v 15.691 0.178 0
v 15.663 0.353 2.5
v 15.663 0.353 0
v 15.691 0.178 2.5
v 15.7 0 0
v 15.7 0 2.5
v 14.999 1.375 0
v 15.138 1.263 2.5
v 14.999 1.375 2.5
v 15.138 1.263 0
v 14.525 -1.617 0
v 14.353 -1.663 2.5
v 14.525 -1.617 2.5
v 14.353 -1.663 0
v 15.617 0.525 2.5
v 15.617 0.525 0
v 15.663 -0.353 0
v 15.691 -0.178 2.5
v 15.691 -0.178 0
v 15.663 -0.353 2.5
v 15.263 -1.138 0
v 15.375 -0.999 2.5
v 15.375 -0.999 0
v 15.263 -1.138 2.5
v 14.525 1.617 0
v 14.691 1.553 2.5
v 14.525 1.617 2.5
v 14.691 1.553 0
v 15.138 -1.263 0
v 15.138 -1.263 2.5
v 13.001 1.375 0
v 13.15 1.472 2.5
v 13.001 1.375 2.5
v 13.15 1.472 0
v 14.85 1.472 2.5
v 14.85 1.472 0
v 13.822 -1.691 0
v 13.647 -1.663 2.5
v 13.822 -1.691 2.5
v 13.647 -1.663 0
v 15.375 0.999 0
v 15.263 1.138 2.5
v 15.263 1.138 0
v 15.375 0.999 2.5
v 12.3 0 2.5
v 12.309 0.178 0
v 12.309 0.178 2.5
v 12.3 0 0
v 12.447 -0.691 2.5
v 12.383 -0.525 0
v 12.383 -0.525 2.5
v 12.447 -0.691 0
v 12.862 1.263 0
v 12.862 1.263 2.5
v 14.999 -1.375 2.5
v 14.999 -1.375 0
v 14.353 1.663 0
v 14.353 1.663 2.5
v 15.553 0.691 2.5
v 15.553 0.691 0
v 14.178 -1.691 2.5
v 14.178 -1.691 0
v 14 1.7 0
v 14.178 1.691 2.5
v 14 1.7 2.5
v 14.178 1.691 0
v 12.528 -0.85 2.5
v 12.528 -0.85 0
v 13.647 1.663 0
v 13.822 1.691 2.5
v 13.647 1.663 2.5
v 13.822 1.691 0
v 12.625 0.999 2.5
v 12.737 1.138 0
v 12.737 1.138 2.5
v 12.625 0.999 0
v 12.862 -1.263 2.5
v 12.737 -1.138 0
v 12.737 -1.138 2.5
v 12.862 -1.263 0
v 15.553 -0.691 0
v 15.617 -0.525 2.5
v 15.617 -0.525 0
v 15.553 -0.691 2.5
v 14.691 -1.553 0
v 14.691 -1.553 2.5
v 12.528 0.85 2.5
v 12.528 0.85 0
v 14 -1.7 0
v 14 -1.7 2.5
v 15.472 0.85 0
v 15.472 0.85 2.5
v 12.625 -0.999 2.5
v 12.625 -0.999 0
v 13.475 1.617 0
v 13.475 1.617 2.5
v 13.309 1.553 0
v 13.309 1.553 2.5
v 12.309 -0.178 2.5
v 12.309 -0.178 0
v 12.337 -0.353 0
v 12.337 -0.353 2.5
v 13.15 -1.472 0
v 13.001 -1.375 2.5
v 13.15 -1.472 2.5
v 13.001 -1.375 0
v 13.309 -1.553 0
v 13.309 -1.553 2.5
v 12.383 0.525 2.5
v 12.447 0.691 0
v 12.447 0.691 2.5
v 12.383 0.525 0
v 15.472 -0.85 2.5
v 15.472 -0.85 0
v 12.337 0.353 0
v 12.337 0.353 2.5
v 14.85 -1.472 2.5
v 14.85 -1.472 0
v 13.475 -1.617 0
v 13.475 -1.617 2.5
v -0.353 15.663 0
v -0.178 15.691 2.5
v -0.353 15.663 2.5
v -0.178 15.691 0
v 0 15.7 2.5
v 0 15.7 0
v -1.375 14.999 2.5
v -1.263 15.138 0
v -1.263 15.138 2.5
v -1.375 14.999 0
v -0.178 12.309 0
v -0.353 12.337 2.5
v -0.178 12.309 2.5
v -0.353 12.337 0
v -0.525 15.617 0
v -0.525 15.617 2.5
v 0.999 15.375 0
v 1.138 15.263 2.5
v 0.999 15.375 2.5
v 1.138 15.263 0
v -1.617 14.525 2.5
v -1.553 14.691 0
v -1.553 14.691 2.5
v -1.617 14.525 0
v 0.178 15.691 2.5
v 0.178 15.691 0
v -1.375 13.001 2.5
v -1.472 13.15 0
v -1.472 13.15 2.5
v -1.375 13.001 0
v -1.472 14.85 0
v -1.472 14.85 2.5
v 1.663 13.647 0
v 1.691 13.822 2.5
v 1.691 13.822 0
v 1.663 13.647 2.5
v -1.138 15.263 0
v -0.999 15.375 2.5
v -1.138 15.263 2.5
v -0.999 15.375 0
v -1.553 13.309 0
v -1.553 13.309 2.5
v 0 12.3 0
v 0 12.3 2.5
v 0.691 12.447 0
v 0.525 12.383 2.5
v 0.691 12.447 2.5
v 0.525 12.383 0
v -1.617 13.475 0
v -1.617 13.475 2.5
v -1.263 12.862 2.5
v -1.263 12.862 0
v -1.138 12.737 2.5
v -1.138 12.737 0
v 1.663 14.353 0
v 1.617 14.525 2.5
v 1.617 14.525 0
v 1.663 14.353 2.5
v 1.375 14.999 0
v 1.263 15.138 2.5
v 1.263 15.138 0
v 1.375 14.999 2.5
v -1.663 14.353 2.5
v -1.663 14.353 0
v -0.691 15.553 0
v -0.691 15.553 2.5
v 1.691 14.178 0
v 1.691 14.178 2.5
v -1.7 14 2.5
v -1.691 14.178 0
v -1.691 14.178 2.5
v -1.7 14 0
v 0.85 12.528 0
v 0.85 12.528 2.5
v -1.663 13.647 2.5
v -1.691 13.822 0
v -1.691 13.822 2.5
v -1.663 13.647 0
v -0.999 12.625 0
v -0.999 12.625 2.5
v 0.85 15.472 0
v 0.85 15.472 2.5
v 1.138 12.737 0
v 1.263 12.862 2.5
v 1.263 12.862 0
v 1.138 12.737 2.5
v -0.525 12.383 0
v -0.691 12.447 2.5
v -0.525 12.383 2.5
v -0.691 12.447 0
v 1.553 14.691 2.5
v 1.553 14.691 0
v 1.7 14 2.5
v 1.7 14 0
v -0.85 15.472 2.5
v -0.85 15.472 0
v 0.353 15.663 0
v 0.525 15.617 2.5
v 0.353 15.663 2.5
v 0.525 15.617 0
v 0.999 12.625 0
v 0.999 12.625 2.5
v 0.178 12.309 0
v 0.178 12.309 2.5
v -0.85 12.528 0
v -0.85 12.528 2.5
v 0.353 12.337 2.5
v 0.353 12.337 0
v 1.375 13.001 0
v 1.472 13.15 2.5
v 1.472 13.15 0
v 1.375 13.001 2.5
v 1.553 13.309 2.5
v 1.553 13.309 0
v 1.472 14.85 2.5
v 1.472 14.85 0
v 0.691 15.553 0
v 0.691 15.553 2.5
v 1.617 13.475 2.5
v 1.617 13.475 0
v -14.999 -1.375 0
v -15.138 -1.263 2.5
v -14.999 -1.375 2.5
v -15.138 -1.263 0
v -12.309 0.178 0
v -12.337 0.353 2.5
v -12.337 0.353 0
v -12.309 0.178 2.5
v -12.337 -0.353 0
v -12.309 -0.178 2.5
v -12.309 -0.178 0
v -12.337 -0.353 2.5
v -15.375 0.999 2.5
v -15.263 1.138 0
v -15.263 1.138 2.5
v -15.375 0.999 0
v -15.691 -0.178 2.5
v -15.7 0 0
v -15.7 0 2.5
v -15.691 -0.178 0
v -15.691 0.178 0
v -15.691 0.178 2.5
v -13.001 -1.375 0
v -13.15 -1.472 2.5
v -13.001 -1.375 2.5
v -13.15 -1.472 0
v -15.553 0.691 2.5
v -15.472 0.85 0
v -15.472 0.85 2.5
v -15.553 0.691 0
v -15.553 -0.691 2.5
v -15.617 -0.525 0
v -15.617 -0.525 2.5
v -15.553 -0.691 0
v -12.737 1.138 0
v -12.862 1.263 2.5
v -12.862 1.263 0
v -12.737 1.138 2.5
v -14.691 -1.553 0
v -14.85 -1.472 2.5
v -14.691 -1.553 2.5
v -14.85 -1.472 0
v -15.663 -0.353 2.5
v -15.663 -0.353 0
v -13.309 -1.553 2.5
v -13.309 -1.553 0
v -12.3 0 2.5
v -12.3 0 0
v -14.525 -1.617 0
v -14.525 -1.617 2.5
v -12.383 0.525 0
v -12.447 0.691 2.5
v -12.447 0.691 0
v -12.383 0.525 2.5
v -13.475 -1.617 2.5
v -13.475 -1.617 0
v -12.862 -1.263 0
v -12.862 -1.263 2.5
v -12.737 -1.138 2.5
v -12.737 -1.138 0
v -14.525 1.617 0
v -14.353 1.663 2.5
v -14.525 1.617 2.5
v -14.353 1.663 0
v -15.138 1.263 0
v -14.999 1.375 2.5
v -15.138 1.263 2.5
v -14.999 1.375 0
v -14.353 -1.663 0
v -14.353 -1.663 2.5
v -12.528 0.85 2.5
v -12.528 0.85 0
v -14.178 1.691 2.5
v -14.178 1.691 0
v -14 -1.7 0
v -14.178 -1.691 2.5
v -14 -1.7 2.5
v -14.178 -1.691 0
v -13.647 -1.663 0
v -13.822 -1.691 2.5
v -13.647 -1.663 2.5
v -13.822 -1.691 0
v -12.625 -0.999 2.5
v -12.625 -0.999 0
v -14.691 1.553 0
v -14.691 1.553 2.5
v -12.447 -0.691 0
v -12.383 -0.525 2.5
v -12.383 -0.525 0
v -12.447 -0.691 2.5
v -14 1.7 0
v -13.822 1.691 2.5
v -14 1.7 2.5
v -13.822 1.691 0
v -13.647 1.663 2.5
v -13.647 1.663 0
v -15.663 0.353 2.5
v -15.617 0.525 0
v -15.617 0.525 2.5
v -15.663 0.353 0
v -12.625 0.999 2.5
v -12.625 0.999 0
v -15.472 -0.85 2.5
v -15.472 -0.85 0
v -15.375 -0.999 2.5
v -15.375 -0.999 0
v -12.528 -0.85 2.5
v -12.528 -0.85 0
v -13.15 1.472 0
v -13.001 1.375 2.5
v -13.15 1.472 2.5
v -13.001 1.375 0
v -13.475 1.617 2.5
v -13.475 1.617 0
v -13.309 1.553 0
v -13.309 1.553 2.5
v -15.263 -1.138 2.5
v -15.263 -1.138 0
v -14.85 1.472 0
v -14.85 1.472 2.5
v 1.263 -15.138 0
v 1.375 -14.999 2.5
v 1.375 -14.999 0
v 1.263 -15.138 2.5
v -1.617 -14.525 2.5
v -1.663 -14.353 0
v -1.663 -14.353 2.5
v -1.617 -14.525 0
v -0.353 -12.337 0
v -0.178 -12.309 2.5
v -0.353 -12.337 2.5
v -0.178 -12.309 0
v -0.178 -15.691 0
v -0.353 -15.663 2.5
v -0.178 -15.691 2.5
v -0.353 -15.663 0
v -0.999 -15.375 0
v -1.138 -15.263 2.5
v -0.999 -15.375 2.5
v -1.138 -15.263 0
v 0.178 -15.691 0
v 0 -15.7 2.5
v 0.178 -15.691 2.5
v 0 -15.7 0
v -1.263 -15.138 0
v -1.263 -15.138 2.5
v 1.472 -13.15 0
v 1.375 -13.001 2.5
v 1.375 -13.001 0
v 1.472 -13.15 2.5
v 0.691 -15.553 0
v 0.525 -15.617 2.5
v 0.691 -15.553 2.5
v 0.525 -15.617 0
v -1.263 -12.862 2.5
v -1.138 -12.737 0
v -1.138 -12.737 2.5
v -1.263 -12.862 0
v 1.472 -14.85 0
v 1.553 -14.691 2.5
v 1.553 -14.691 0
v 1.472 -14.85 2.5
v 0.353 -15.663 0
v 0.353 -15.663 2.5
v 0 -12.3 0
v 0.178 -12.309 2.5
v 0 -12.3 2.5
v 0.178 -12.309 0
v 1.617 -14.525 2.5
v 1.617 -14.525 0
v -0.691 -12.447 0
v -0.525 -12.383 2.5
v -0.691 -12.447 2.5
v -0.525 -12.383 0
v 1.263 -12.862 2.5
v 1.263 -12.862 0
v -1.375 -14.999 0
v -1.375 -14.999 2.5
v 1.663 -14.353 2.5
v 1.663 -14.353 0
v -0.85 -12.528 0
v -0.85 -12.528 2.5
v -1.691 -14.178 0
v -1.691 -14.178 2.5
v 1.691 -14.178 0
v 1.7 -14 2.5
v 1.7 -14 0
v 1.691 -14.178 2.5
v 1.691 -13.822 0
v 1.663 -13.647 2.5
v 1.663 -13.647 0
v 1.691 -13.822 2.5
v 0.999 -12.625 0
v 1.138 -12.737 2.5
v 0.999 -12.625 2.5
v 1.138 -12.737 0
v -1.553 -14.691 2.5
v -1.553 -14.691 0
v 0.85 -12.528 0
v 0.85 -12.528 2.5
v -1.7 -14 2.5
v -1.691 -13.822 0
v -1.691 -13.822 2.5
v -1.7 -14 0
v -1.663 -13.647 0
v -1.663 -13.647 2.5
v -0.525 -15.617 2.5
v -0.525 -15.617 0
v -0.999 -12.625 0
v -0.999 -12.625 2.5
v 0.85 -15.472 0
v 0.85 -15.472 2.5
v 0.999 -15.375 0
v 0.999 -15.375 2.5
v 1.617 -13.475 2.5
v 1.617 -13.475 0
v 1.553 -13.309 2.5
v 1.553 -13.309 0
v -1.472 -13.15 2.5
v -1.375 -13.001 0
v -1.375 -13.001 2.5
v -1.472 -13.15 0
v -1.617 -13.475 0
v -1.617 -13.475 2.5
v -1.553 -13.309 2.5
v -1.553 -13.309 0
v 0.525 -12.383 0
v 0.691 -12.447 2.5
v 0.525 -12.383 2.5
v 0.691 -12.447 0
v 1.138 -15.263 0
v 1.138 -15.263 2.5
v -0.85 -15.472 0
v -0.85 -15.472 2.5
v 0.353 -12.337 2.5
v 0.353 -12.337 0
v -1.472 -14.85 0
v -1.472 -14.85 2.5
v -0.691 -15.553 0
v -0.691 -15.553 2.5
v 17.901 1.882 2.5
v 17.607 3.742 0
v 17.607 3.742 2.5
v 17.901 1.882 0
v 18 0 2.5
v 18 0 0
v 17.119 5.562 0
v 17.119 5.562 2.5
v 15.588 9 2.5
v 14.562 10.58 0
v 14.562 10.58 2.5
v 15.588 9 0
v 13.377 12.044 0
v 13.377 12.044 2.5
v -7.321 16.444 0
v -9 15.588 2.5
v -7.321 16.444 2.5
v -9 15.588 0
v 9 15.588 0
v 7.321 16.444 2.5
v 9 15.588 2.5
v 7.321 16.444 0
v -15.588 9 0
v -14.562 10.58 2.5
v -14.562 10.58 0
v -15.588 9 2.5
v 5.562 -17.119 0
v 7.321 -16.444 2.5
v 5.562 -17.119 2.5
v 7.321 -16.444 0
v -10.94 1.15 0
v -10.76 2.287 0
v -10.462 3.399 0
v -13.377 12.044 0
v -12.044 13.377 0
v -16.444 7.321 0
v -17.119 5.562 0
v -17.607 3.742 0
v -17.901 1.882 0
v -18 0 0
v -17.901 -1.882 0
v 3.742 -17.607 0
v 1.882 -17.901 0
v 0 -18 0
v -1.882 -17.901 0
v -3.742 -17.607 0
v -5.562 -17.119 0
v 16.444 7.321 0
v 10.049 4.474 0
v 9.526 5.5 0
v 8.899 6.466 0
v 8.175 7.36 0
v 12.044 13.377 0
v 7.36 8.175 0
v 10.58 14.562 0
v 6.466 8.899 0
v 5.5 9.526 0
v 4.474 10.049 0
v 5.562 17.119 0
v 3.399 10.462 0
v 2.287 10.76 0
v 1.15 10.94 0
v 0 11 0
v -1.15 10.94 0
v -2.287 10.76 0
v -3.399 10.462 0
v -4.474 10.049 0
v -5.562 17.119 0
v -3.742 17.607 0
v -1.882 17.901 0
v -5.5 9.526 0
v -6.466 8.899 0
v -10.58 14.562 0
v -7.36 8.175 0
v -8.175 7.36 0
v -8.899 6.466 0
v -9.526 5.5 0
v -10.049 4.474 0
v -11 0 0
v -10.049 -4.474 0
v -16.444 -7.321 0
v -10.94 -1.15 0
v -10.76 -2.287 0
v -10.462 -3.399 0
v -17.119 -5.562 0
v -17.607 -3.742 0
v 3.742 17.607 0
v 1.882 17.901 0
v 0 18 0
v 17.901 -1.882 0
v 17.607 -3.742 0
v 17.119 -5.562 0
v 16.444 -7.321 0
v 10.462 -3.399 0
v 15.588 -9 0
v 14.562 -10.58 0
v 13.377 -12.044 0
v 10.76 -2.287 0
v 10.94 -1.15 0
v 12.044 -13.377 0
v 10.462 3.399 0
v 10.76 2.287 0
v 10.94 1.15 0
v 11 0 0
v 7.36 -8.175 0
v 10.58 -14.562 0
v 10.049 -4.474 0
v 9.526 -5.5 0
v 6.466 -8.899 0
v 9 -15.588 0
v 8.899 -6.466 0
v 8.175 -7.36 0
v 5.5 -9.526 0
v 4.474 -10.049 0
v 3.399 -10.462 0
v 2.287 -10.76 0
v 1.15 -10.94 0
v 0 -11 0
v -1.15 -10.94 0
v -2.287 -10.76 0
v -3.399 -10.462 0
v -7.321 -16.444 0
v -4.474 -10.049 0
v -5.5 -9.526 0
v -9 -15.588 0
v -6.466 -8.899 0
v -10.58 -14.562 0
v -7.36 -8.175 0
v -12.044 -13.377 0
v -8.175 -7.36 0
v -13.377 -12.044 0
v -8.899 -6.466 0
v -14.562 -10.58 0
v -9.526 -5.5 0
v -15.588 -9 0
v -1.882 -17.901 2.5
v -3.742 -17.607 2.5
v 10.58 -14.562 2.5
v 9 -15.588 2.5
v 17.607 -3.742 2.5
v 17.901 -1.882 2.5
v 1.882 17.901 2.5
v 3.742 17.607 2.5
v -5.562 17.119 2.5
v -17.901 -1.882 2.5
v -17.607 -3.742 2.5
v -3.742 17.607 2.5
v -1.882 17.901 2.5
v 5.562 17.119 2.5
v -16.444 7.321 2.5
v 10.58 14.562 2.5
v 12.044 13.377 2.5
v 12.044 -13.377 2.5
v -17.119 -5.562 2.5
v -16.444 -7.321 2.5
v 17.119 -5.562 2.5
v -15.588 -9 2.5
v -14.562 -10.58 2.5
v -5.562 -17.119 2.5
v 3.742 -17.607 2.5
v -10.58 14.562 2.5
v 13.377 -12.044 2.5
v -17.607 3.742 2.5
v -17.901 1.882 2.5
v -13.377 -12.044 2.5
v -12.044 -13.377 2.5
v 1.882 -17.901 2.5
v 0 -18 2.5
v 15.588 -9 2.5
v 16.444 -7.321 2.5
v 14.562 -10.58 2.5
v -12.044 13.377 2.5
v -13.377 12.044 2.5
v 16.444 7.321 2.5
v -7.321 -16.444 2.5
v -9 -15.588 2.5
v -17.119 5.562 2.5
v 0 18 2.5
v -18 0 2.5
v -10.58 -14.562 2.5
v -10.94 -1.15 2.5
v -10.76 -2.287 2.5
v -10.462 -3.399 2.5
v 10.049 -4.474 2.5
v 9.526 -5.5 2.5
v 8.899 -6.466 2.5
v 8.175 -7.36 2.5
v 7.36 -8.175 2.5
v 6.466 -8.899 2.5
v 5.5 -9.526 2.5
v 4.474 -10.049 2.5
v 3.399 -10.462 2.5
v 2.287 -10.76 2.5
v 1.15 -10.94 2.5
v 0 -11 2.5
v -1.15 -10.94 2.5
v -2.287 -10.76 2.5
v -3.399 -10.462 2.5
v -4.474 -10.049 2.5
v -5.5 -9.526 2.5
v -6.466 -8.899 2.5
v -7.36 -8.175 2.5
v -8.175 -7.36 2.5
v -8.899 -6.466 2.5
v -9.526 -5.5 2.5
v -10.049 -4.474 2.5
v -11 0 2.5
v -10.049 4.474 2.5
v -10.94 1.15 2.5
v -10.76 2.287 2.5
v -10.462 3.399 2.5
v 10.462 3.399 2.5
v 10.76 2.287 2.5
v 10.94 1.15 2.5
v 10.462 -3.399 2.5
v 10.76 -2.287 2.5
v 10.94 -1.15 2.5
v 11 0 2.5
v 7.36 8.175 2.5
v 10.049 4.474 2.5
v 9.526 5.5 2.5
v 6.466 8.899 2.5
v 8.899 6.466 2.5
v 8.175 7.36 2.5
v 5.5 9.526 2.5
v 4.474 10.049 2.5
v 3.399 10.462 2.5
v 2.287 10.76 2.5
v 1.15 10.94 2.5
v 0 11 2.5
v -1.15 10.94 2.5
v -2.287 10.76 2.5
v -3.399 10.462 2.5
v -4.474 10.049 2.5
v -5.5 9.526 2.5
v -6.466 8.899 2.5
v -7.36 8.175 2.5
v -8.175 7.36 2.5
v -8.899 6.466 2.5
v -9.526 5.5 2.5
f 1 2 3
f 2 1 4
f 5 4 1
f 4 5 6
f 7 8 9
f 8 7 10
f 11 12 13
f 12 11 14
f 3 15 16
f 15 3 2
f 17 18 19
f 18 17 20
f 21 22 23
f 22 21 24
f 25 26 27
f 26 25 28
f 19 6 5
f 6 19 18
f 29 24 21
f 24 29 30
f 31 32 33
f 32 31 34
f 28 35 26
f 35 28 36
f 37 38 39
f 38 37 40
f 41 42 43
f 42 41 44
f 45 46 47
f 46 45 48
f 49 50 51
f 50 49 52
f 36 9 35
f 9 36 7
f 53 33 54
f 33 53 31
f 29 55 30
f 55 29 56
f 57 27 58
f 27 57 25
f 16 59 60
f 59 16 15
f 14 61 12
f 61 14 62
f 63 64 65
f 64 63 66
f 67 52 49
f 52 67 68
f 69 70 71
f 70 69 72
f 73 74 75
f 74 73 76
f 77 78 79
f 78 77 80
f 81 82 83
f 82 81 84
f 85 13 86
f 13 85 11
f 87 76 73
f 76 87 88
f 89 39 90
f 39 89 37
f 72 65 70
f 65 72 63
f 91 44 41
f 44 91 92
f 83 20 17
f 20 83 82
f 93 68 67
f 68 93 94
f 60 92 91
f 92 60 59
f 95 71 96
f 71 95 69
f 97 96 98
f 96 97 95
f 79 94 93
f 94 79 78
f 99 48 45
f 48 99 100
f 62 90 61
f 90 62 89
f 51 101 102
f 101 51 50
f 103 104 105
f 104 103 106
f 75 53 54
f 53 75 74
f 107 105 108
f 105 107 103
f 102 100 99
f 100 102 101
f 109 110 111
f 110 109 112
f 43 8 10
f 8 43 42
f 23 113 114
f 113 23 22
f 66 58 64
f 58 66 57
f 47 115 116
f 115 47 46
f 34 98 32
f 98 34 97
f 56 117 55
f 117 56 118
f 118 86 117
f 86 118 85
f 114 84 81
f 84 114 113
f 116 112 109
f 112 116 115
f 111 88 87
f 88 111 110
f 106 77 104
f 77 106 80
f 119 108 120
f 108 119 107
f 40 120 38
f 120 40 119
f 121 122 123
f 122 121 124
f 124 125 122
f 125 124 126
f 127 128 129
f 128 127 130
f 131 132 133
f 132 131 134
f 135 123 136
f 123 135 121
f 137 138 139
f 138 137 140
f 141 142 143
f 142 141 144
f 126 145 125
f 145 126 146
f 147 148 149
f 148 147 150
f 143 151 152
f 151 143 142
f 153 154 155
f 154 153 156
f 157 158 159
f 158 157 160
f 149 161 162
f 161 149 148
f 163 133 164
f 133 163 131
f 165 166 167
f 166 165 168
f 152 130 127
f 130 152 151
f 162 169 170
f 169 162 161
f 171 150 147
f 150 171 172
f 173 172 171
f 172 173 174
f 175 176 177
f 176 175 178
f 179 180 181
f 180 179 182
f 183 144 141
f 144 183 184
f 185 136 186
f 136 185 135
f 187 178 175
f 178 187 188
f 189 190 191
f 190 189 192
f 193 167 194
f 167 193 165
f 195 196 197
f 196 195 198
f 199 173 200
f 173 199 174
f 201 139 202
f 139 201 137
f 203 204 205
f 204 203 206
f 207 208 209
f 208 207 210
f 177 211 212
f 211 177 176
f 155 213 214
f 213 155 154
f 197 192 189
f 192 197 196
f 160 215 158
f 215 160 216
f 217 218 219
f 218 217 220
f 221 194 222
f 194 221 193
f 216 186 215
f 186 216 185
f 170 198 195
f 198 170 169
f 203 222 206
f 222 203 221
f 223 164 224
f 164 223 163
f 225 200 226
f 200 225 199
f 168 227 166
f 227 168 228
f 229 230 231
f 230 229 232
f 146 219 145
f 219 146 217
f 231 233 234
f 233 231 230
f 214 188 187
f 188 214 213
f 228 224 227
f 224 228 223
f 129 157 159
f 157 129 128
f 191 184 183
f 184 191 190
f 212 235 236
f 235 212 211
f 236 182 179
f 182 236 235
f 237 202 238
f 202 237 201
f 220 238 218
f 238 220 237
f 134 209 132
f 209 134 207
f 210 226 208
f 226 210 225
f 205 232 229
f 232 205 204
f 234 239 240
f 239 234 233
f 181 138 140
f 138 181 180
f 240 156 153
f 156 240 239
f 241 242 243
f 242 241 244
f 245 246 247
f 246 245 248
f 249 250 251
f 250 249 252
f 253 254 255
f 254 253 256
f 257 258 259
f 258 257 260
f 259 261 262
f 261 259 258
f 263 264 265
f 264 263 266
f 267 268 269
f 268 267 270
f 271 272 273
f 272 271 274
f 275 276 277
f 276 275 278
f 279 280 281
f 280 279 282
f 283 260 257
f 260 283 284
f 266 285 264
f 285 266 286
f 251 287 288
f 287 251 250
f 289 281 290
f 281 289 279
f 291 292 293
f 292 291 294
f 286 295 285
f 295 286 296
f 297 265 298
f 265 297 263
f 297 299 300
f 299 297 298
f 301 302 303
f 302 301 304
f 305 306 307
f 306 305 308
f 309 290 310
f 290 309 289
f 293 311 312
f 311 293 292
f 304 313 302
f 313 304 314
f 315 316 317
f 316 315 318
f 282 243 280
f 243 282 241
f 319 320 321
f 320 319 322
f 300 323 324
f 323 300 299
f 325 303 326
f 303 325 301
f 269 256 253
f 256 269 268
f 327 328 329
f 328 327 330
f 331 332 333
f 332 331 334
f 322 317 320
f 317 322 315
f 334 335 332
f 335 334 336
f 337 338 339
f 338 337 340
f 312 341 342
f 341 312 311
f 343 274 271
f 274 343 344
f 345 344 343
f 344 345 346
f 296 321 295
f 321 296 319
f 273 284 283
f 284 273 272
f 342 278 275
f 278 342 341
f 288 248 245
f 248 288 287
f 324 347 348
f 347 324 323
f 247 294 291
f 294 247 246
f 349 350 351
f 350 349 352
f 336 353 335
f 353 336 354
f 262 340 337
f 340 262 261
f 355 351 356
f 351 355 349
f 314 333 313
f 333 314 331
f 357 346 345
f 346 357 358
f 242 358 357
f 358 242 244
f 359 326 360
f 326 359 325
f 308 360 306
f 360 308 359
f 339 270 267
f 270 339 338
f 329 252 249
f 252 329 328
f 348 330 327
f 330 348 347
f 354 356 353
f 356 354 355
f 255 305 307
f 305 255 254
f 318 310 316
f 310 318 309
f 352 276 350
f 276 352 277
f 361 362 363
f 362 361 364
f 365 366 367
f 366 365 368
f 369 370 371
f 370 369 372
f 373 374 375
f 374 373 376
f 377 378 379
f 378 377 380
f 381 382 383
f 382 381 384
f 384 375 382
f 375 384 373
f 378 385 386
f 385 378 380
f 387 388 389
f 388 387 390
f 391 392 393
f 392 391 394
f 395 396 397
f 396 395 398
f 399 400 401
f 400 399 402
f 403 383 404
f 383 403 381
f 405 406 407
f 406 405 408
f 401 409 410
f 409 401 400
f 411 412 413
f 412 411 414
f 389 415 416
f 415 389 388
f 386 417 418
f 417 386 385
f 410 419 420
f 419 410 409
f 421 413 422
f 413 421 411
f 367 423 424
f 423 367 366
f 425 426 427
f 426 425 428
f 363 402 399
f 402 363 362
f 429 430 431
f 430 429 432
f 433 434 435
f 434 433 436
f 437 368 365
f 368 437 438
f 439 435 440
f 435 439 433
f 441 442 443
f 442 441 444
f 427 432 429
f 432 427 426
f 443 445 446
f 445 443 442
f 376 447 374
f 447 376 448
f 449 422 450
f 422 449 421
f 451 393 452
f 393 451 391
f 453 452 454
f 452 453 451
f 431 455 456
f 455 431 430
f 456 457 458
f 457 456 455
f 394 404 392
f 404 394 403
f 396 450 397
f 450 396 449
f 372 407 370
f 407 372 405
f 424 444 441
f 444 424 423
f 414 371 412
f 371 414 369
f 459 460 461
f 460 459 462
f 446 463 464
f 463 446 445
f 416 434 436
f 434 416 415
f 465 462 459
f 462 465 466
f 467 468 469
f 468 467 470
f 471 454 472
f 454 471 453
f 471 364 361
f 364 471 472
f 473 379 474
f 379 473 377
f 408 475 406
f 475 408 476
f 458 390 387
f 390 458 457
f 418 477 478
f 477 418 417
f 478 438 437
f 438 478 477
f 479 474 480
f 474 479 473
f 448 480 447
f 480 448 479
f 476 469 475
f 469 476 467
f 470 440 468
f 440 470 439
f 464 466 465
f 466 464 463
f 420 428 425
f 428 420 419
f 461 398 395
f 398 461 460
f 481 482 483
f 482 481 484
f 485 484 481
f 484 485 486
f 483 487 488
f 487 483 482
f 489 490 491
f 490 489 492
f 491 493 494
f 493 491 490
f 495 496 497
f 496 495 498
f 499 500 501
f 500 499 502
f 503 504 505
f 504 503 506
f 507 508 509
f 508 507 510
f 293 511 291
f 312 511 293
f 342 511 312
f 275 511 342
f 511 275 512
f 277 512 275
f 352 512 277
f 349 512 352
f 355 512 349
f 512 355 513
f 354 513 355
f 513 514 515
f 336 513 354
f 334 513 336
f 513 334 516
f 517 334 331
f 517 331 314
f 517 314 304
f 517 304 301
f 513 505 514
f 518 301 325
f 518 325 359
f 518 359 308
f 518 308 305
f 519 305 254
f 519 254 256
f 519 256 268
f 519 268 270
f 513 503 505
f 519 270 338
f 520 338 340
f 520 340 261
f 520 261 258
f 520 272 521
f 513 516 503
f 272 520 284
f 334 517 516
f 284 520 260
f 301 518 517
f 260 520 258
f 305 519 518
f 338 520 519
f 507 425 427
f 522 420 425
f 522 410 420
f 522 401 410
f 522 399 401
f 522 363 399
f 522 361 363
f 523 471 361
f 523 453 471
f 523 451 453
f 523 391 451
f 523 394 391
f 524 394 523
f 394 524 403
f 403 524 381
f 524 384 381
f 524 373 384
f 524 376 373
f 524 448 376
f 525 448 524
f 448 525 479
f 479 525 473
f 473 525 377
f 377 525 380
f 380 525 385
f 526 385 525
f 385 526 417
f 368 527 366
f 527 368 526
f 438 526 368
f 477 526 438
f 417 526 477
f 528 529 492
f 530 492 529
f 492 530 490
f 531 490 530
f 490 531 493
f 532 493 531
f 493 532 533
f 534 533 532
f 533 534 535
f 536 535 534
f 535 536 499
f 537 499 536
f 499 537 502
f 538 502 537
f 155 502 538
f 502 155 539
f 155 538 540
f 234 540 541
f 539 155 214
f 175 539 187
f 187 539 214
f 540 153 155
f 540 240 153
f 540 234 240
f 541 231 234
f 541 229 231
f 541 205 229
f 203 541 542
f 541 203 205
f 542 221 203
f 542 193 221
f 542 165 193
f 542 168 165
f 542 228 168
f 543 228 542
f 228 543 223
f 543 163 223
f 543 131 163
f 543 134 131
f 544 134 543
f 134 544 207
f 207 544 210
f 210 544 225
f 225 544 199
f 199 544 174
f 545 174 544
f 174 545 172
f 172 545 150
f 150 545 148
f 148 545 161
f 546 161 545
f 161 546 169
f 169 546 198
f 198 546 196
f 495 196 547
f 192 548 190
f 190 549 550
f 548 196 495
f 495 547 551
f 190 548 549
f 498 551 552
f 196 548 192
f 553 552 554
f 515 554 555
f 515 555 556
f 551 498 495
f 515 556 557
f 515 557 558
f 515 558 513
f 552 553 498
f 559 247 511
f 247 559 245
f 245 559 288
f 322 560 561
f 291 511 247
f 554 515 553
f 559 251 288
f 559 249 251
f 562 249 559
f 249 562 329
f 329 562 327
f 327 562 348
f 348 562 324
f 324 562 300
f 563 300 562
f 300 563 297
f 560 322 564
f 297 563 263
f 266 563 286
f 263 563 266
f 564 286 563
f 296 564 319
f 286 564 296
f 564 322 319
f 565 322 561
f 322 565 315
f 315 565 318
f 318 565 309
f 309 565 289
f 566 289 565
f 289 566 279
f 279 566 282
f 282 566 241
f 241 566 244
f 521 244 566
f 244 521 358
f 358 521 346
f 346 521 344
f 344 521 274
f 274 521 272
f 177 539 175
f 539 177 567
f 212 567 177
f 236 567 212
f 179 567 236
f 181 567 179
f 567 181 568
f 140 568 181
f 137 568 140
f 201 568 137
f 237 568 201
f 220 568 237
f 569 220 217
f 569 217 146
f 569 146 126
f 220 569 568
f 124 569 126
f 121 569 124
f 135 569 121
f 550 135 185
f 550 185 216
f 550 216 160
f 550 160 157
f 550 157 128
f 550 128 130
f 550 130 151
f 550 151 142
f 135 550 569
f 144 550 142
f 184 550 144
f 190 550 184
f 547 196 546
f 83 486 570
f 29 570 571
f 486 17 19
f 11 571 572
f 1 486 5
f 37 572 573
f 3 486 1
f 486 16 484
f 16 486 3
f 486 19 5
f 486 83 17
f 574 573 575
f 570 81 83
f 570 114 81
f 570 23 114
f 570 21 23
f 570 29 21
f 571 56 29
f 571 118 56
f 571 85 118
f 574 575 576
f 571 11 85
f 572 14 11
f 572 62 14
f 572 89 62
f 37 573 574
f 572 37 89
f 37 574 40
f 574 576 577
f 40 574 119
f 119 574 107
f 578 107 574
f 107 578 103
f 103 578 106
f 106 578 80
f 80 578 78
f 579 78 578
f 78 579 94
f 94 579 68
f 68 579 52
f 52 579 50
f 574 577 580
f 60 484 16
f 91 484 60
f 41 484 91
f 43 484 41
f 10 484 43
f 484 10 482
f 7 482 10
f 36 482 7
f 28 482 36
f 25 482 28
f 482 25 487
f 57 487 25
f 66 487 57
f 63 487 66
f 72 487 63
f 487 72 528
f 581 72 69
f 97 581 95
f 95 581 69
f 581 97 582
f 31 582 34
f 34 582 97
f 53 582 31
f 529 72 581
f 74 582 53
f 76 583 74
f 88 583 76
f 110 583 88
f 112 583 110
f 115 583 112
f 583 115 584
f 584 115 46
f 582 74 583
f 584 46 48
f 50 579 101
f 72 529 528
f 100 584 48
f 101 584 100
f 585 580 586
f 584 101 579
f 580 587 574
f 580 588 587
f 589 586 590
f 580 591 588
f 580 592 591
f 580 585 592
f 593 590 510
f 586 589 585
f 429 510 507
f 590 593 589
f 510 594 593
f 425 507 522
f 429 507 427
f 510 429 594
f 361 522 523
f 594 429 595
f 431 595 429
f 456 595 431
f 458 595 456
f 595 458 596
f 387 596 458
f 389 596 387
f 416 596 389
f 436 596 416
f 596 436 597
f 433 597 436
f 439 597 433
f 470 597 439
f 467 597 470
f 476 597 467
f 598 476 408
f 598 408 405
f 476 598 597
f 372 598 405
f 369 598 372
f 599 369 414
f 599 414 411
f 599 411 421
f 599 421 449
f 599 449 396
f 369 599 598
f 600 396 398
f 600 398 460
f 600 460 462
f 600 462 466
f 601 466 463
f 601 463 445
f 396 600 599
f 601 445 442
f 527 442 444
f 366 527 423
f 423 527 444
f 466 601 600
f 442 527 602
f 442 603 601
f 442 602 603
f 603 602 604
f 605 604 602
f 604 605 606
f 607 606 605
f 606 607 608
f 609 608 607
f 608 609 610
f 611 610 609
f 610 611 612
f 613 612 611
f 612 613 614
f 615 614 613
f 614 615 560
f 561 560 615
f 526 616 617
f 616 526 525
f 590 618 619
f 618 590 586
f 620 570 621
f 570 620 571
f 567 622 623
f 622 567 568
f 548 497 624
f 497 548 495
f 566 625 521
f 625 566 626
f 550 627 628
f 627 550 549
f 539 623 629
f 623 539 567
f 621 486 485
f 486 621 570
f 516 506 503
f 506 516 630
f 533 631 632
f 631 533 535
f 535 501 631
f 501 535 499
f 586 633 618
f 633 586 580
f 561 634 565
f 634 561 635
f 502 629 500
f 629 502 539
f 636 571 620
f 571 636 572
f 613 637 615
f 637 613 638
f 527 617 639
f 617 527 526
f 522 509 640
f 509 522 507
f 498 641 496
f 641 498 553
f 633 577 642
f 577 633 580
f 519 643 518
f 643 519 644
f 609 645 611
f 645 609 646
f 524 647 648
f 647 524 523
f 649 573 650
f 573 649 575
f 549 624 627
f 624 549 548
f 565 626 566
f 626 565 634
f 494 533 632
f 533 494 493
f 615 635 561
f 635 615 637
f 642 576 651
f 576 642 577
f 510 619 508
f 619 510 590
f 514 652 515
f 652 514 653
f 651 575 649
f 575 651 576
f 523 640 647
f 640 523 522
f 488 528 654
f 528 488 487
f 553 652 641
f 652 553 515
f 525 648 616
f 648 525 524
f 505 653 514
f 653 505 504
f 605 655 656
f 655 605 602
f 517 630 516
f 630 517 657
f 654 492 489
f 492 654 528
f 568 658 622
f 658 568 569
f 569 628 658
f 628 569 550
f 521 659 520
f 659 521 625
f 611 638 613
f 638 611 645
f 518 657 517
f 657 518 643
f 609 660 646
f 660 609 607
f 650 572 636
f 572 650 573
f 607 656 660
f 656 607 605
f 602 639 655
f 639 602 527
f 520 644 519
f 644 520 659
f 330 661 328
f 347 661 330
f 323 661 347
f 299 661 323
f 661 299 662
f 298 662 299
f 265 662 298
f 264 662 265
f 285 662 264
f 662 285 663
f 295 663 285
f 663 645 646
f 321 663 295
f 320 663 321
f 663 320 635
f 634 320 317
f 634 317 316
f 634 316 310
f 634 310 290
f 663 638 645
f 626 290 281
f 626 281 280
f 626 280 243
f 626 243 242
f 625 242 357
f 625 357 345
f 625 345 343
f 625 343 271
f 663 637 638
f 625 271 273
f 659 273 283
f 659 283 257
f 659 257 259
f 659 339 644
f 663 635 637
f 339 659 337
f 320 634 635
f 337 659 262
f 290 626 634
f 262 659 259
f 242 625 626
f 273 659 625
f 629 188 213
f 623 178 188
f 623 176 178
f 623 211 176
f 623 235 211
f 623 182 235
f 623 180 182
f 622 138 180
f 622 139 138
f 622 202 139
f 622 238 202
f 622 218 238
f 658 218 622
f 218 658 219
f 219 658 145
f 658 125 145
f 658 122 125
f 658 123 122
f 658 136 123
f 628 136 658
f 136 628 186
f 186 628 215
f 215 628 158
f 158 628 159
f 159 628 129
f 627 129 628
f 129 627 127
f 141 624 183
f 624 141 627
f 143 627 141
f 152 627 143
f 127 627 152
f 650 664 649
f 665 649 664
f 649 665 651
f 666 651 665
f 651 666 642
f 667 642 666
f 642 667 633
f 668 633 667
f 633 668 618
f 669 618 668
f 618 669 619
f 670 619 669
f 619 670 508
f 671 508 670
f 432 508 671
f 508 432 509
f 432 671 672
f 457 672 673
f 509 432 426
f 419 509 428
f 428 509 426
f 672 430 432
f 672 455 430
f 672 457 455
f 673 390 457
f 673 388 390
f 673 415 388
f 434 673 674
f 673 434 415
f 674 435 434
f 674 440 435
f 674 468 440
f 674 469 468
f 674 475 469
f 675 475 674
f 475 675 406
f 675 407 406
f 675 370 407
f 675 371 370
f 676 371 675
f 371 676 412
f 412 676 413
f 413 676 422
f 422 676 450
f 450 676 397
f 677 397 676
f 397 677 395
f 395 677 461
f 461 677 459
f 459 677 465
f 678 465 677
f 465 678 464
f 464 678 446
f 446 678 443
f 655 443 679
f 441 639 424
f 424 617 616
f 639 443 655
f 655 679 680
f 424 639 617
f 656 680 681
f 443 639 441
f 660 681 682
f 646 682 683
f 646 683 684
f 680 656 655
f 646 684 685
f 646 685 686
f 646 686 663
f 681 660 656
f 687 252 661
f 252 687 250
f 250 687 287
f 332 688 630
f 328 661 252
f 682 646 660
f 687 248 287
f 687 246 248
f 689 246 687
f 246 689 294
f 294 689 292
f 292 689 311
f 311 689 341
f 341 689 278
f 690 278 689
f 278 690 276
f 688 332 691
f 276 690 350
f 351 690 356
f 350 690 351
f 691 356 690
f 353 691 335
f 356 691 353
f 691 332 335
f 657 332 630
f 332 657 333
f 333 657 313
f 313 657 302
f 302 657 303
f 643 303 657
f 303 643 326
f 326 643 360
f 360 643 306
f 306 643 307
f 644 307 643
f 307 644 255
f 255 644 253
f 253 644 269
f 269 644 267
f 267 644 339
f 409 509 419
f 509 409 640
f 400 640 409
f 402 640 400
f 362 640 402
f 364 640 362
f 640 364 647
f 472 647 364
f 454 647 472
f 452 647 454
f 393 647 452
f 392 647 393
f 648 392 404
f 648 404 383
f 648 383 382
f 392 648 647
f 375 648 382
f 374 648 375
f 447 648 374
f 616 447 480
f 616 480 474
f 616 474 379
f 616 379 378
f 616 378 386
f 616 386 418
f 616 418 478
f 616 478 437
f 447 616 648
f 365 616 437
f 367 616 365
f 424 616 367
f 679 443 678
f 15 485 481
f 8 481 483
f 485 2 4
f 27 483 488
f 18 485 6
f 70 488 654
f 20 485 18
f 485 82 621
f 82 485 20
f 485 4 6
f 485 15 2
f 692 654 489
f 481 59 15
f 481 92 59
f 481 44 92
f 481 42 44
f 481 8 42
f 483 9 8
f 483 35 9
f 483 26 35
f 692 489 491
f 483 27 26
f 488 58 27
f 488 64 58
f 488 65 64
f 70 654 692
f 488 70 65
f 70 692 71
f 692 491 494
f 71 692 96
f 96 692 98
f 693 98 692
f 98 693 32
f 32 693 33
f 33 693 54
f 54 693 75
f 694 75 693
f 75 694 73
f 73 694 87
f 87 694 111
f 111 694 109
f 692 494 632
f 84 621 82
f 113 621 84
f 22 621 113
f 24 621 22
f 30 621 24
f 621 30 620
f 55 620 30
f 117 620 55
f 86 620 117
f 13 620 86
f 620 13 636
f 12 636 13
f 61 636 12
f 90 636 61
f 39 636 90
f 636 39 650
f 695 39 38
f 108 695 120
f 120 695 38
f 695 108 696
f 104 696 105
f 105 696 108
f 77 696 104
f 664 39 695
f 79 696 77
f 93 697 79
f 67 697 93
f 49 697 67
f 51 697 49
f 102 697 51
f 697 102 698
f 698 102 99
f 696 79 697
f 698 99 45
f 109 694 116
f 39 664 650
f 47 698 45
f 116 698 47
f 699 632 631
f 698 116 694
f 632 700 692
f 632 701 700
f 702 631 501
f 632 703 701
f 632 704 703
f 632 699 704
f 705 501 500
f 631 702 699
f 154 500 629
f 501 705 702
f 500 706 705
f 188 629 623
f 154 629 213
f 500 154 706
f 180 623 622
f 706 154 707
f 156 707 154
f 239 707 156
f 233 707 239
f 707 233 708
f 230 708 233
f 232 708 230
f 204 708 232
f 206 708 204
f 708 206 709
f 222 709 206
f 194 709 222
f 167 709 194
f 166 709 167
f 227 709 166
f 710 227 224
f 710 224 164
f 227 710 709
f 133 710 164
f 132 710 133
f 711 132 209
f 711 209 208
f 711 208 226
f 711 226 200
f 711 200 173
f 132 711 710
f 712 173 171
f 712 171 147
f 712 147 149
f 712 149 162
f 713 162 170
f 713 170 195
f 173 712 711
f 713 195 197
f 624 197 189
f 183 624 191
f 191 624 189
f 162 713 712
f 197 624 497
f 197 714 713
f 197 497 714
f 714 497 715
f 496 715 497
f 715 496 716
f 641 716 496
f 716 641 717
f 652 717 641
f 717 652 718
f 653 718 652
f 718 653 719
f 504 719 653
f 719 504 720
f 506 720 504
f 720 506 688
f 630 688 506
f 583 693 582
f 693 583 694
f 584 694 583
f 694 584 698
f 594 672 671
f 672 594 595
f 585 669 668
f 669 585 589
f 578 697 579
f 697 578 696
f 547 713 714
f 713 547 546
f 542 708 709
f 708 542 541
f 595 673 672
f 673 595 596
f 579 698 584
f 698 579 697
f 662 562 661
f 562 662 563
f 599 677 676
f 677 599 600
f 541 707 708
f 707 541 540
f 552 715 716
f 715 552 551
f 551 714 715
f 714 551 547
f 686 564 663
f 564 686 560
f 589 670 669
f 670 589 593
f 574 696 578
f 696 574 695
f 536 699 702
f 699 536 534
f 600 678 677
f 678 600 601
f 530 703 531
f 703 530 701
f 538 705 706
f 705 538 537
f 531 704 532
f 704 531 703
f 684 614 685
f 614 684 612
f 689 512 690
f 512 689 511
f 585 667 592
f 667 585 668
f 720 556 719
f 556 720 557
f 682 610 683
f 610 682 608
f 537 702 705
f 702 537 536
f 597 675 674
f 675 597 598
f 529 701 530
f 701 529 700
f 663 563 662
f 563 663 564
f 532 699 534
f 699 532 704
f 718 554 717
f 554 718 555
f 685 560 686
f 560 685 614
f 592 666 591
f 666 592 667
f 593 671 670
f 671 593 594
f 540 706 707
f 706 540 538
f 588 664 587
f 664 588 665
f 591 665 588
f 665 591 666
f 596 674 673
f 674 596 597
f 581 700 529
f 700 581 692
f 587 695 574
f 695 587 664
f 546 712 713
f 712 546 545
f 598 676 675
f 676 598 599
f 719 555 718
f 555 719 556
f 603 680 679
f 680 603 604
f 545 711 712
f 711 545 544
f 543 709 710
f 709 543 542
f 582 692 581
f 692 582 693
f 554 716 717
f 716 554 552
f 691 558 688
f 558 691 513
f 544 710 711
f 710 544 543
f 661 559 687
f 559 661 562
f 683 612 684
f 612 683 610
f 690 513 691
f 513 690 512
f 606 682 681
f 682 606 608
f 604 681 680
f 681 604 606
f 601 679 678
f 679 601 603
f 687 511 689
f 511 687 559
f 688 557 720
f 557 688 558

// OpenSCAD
// Bearing retaining ring.
$fn = 60;
eps = 0.02;
bearing_d = 22;
outer_d = 36;
thickness = 2.5;
difference() {
    cylinder(d=outer_d,h=thickness);
    translate([0,0,-eps]) cylinder(d=bearing_d,h=thickness+2*eps);
    for (i=[0:3]) rotate([0,0,i*90]) translate([outer_d/2-4,0,-eps]) cylinder(d=3.4,h=thickness+2*eps);
}
